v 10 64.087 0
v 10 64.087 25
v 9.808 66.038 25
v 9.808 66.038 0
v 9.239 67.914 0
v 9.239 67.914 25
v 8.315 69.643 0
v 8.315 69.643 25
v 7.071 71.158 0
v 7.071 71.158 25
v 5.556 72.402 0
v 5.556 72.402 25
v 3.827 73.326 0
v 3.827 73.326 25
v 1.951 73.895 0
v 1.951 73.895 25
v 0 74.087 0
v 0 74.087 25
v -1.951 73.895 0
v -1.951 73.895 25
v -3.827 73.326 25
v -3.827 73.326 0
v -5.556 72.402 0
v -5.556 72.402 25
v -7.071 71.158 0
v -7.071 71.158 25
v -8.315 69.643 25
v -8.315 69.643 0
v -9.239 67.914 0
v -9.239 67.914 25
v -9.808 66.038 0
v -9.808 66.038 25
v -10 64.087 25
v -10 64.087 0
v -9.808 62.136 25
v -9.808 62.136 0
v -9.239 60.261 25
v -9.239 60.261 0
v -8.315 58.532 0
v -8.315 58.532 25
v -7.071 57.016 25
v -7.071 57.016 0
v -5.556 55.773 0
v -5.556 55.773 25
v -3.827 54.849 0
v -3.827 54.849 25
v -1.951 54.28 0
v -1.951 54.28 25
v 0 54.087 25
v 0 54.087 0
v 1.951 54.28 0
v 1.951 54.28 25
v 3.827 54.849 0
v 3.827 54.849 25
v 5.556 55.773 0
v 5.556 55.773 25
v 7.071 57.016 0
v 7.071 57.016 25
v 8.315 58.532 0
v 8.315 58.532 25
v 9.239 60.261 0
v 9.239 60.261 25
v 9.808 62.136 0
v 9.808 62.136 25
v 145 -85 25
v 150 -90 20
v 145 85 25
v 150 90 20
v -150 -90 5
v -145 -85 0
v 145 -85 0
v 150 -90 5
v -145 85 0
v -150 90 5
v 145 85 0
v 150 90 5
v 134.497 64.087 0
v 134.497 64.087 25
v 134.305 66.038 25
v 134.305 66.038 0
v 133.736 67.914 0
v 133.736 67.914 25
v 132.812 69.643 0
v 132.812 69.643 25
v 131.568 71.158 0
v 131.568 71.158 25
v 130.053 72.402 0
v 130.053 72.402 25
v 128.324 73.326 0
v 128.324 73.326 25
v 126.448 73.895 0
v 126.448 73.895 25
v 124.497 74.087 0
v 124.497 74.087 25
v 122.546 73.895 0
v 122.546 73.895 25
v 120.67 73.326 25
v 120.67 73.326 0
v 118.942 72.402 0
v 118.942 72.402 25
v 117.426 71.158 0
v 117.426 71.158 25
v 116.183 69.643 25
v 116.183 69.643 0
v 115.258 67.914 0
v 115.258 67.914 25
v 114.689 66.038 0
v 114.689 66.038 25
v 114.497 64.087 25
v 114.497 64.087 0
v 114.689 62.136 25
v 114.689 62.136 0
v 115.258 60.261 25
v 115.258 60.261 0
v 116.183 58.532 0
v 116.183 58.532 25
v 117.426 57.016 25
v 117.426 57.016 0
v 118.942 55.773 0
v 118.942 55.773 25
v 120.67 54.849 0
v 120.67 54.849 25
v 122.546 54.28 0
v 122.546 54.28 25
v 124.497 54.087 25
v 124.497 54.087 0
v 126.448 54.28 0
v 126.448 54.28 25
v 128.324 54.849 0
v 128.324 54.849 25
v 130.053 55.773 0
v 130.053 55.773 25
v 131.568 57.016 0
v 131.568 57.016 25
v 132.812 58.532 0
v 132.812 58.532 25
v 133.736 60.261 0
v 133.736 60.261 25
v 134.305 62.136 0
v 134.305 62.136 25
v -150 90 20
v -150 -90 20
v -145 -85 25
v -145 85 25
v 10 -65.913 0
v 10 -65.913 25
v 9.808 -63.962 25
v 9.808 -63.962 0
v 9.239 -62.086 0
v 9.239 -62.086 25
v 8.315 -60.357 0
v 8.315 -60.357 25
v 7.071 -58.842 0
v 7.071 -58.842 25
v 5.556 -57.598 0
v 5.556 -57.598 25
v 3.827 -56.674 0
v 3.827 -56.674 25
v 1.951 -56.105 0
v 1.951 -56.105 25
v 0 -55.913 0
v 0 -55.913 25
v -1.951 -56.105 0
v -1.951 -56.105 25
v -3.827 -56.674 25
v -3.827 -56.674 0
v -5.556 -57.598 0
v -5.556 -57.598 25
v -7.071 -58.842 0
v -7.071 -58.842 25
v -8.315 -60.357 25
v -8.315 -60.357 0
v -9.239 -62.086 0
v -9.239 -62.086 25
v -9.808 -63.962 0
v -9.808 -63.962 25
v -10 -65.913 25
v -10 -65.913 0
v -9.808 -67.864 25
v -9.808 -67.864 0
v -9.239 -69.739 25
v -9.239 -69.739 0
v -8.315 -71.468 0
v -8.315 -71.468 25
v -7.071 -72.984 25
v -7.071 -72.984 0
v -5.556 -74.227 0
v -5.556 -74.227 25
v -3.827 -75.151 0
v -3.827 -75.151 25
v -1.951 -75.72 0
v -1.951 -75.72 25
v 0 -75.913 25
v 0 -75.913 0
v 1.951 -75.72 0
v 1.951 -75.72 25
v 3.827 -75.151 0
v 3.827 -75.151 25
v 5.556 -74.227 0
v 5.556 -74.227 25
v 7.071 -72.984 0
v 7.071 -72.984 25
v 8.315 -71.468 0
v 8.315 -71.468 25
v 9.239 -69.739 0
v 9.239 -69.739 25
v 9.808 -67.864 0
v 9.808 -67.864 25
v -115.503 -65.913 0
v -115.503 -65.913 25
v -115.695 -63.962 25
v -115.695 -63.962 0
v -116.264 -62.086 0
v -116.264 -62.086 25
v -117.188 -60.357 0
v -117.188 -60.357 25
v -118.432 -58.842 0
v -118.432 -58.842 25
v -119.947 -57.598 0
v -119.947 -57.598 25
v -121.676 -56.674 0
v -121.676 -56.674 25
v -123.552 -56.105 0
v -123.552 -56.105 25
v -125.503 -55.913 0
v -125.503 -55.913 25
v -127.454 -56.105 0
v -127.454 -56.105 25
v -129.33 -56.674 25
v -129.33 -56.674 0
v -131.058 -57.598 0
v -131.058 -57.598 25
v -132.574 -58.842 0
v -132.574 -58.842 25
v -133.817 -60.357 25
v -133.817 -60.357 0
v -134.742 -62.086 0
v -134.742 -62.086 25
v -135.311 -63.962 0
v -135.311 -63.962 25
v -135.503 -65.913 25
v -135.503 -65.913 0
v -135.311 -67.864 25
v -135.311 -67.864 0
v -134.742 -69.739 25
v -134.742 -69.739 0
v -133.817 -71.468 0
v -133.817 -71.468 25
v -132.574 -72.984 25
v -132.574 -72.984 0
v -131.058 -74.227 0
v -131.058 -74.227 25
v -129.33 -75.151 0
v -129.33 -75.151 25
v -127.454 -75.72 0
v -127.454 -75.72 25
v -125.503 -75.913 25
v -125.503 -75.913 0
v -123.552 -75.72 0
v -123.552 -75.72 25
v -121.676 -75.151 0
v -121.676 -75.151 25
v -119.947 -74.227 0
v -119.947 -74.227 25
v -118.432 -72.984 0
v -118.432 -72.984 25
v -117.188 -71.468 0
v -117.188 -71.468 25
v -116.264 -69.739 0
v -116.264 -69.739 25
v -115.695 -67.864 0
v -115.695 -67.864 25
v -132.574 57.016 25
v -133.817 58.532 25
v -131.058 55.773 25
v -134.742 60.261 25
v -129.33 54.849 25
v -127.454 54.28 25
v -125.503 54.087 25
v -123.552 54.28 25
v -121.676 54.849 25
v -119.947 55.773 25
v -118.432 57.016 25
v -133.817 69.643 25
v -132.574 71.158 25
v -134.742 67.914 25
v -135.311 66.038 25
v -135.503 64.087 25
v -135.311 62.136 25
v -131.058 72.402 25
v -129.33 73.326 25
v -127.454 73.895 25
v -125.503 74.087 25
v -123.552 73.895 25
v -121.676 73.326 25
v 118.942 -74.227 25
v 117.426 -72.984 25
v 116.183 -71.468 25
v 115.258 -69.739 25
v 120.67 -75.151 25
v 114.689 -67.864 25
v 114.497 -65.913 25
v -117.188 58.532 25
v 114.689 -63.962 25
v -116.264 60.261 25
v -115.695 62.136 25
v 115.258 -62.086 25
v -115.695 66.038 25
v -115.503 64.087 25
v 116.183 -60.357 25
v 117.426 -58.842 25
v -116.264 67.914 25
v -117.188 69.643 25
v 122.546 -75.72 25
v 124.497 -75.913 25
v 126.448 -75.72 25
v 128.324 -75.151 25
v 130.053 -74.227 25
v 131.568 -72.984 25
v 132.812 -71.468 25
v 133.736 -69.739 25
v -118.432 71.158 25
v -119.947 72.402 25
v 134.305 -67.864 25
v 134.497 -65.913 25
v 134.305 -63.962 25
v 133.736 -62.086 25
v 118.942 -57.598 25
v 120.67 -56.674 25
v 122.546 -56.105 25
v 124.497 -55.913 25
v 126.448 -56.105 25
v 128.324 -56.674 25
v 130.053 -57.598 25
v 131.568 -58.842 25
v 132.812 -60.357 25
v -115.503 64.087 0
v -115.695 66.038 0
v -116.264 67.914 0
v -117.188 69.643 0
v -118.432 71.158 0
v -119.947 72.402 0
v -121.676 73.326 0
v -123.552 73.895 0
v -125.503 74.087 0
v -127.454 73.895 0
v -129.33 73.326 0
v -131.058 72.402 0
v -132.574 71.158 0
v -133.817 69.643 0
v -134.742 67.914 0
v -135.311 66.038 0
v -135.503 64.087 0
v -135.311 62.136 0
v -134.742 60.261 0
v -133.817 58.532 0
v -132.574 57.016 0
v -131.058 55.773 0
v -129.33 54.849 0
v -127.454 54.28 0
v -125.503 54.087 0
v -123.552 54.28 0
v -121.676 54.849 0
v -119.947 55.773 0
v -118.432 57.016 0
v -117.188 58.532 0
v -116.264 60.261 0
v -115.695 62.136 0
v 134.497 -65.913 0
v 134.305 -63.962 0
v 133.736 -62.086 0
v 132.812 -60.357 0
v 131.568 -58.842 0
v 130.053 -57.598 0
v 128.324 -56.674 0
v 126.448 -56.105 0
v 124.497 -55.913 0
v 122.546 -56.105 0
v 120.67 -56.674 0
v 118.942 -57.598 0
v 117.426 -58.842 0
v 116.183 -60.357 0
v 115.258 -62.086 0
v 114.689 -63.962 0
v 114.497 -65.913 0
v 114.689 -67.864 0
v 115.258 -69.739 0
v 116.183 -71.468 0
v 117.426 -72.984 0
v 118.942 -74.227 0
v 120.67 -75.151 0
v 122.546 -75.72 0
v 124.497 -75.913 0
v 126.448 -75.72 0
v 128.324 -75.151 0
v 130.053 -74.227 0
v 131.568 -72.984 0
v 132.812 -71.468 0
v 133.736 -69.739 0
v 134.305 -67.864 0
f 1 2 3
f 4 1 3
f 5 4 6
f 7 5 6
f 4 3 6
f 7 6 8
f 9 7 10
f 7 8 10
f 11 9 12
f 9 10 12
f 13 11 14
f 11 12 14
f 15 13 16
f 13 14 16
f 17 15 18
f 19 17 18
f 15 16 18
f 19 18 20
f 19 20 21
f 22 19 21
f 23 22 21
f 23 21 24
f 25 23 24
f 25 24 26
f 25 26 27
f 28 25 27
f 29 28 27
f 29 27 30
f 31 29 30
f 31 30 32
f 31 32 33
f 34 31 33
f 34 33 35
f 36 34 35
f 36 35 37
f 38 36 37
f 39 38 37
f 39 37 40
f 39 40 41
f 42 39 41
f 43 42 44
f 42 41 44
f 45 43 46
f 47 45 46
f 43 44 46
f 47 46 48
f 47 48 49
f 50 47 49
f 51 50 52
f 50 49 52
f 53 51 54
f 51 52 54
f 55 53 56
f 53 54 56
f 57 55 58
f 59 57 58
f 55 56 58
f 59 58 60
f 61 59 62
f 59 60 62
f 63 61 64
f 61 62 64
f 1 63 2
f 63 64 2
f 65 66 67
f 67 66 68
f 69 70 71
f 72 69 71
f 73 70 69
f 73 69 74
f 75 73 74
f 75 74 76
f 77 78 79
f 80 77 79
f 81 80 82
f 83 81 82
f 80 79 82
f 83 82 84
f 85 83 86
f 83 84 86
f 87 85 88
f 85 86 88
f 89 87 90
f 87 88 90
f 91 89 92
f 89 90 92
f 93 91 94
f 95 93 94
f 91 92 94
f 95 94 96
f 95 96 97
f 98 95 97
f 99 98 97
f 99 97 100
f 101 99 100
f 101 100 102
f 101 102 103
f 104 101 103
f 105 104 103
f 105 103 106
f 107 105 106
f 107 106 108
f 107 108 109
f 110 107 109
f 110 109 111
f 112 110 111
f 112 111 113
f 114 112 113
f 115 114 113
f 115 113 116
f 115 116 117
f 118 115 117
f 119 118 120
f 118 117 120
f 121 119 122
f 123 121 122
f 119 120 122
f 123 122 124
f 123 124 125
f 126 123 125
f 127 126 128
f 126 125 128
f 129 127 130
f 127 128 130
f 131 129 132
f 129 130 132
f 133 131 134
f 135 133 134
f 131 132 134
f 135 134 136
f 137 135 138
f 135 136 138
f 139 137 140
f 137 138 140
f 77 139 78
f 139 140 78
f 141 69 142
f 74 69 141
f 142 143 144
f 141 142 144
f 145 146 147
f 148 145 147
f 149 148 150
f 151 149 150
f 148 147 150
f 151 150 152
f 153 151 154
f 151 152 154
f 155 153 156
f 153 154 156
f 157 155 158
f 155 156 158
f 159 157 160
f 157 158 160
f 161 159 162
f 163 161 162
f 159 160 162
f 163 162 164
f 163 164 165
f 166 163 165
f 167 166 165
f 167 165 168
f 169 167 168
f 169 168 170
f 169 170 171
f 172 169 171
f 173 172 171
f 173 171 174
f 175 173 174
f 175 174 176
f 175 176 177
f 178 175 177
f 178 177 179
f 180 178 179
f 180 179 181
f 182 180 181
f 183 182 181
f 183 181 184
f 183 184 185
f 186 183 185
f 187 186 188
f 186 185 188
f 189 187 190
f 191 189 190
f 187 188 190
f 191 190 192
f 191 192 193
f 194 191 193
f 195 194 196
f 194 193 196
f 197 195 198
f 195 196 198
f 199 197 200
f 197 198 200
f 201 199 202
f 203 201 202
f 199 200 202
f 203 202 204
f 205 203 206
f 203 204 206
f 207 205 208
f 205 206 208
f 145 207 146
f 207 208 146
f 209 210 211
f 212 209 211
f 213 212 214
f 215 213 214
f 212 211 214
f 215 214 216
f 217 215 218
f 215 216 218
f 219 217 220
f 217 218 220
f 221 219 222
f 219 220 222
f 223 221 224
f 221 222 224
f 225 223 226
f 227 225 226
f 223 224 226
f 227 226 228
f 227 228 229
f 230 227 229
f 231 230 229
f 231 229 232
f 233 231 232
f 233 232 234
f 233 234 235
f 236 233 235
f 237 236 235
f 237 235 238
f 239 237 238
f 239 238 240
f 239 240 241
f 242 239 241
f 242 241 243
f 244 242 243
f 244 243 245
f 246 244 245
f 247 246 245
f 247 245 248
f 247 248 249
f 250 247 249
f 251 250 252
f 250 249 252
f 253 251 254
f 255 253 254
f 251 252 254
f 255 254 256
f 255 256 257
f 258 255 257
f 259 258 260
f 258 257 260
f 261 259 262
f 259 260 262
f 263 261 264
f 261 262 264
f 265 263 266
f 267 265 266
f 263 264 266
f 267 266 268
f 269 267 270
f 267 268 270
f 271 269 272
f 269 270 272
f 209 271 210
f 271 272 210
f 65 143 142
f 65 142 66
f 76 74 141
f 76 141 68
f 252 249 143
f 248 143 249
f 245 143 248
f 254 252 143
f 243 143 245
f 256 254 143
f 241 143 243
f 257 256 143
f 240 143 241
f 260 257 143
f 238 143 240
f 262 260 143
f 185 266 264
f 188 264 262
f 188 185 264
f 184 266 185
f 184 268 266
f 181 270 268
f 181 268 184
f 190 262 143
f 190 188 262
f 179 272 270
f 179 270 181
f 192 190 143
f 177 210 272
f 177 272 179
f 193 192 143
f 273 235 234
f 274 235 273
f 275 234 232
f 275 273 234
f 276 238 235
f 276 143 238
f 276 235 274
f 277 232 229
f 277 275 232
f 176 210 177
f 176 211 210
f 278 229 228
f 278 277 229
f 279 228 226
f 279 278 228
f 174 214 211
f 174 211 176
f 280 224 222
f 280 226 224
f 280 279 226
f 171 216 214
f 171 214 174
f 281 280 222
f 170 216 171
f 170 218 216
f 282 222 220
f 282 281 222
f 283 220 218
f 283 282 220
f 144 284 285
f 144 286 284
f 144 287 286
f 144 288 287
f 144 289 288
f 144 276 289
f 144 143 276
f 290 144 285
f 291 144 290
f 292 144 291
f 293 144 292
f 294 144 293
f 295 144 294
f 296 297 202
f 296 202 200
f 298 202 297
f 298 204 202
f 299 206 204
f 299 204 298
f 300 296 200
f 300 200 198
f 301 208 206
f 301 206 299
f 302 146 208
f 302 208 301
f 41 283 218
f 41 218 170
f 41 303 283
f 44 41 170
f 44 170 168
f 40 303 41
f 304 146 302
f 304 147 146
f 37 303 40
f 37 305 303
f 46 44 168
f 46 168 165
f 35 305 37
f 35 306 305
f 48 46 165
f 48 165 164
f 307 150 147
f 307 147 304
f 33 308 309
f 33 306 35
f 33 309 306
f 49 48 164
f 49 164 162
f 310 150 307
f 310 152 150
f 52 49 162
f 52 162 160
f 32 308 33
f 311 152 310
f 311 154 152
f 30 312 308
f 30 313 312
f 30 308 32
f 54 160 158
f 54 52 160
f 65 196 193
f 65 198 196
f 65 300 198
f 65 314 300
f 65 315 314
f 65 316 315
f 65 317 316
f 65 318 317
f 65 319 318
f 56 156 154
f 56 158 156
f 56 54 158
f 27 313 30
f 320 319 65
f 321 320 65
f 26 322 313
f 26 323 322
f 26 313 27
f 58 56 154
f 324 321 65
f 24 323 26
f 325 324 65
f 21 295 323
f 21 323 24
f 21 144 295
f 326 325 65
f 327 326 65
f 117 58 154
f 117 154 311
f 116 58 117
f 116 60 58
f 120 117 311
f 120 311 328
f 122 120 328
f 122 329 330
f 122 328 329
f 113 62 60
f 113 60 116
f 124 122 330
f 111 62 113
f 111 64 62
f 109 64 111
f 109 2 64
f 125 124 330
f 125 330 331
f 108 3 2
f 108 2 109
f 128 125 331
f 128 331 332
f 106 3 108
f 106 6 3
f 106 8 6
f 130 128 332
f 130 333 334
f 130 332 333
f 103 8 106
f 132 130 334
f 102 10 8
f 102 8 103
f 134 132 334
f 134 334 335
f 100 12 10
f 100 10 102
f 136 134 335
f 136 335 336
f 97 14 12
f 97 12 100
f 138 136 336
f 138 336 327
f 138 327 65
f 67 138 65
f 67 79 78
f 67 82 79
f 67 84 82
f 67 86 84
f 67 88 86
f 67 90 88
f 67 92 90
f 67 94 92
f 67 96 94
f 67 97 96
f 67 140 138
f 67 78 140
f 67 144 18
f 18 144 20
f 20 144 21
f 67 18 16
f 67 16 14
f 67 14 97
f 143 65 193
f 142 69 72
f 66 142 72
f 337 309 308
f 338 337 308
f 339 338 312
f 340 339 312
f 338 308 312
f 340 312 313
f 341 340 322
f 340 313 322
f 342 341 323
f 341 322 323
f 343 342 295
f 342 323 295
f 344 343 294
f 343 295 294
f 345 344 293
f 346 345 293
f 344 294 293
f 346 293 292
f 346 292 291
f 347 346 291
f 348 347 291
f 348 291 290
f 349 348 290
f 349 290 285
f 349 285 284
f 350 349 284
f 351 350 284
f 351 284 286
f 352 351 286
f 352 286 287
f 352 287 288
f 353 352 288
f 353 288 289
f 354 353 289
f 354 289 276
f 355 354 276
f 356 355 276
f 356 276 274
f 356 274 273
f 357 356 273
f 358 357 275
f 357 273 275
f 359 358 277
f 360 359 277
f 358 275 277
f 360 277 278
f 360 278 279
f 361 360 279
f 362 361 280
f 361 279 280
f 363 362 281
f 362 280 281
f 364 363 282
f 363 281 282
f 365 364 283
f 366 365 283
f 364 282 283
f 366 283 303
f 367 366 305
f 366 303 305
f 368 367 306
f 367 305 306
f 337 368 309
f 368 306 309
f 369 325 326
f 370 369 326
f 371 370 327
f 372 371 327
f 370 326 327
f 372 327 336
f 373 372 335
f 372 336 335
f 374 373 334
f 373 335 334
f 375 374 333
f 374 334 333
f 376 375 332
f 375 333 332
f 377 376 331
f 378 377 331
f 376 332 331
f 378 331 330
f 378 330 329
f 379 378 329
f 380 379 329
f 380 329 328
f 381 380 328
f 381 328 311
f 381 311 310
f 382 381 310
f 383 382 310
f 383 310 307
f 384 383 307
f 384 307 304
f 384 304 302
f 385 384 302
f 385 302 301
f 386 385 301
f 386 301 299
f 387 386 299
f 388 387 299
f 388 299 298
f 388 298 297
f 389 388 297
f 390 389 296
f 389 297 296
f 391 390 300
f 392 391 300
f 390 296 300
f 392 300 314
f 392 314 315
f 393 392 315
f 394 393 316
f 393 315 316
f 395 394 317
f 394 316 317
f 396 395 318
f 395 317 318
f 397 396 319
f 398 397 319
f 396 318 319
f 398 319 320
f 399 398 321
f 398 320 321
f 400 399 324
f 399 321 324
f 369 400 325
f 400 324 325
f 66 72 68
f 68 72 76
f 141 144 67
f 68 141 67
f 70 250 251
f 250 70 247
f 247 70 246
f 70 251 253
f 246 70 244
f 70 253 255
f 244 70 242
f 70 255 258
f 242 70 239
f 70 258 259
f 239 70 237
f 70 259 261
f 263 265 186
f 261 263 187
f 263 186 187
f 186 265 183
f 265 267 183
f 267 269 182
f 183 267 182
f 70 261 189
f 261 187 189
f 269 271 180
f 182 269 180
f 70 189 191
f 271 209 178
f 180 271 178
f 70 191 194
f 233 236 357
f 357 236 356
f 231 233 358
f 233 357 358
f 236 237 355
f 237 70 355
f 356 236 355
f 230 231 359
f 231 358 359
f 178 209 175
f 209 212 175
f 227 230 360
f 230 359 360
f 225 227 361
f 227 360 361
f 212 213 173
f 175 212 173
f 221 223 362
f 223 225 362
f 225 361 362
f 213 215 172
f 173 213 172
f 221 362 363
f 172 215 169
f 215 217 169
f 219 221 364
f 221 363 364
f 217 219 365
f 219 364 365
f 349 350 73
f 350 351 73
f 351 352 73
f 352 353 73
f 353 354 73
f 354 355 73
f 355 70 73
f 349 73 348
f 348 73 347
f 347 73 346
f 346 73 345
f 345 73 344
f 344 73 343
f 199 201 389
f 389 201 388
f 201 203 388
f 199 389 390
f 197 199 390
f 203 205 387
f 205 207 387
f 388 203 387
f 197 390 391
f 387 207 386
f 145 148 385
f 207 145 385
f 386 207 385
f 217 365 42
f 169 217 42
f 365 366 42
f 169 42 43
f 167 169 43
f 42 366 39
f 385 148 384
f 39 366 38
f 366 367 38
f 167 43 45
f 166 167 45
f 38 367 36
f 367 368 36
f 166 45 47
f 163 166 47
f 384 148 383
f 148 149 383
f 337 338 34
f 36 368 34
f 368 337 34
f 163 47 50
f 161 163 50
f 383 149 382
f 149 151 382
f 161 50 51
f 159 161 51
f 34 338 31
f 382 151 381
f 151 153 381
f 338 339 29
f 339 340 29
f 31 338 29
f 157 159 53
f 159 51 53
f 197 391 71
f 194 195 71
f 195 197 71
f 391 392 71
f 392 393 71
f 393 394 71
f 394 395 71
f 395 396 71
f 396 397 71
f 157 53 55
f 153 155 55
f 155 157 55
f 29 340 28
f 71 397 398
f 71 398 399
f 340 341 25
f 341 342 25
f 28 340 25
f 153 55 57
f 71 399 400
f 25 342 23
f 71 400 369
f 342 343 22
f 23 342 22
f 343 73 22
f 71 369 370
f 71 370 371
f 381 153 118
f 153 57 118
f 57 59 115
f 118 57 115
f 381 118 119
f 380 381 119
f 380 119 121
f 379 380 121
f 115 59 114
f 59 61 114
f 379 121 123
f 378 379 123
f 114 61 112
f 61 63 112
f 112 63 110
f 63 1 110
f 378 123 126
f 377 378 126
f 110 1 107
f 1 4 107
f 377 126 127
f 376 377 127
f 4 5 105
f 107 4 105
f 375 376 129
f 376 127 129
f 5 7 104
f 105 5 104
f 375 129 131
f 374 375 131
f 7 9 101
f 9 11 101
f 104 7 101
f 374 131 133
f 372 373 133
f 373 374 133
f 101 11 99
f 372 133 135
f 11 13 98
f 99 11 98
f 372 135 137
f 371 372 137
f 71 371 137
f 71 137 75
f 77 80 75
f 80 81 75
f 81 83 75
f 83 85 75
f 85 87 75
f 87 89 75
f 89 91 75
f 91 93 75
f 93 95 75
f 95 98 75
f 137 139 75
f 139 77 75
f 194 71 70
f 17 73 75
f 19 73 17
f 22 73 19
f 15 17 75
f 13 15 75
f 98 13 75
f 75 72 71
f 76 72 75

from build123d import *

# Parameters (mm, degrees)
F0_W     = 300
F0_H     = 180
F1_DEPTH = 25
F2_R     = 10
F3_DEPTH = 25.001
F4_SIZE  = 5


with BuildPart() as f1:
    # F0 (on Top) → F1 (new body)
    with BuildSketch(Plane.XY):
        Rectangle(F0_W, F0_H)
    extrude(amount=F1_DEPTH)

    # F2 (on face) → F3 (cut, through all)
    with BuildSketch(Plane.XY.offset(25)):
        with Locations((0, 64.087388)):
            Circle(F2_R)
        with Locations((-125.502721, 64.087388)):
            Circle(F2_R)
        with Locations((-125.502721, -65.912612)):
            Circle(F2_R)
        with Locations((0, -65.912612)):
            Circle(F2_R)
        with Locations((124.497279, -65.912612)):
            Circle(F2_R)
        with Locations((124.497279, 64.087388)):
            Circle(F2_R)
    extrude(amount=-F3_DEPTH, mode=Mode.SUBTRACT)

    # F4
    f4_edges = [f1.edges().sort_by_distance(p)[0] for p in [
        (0, 90, 25),
        (150, 0, 25),
        (0, -90, 25),
        (-150, 0, 25),
        (0, -90, 0),
        (150, 0, 0),
        (0, 90, 0),
        (-150, 0, 0),
    ]]
    chamfer(f4_edges, length=F4_SIZE)


solid = f1.part
